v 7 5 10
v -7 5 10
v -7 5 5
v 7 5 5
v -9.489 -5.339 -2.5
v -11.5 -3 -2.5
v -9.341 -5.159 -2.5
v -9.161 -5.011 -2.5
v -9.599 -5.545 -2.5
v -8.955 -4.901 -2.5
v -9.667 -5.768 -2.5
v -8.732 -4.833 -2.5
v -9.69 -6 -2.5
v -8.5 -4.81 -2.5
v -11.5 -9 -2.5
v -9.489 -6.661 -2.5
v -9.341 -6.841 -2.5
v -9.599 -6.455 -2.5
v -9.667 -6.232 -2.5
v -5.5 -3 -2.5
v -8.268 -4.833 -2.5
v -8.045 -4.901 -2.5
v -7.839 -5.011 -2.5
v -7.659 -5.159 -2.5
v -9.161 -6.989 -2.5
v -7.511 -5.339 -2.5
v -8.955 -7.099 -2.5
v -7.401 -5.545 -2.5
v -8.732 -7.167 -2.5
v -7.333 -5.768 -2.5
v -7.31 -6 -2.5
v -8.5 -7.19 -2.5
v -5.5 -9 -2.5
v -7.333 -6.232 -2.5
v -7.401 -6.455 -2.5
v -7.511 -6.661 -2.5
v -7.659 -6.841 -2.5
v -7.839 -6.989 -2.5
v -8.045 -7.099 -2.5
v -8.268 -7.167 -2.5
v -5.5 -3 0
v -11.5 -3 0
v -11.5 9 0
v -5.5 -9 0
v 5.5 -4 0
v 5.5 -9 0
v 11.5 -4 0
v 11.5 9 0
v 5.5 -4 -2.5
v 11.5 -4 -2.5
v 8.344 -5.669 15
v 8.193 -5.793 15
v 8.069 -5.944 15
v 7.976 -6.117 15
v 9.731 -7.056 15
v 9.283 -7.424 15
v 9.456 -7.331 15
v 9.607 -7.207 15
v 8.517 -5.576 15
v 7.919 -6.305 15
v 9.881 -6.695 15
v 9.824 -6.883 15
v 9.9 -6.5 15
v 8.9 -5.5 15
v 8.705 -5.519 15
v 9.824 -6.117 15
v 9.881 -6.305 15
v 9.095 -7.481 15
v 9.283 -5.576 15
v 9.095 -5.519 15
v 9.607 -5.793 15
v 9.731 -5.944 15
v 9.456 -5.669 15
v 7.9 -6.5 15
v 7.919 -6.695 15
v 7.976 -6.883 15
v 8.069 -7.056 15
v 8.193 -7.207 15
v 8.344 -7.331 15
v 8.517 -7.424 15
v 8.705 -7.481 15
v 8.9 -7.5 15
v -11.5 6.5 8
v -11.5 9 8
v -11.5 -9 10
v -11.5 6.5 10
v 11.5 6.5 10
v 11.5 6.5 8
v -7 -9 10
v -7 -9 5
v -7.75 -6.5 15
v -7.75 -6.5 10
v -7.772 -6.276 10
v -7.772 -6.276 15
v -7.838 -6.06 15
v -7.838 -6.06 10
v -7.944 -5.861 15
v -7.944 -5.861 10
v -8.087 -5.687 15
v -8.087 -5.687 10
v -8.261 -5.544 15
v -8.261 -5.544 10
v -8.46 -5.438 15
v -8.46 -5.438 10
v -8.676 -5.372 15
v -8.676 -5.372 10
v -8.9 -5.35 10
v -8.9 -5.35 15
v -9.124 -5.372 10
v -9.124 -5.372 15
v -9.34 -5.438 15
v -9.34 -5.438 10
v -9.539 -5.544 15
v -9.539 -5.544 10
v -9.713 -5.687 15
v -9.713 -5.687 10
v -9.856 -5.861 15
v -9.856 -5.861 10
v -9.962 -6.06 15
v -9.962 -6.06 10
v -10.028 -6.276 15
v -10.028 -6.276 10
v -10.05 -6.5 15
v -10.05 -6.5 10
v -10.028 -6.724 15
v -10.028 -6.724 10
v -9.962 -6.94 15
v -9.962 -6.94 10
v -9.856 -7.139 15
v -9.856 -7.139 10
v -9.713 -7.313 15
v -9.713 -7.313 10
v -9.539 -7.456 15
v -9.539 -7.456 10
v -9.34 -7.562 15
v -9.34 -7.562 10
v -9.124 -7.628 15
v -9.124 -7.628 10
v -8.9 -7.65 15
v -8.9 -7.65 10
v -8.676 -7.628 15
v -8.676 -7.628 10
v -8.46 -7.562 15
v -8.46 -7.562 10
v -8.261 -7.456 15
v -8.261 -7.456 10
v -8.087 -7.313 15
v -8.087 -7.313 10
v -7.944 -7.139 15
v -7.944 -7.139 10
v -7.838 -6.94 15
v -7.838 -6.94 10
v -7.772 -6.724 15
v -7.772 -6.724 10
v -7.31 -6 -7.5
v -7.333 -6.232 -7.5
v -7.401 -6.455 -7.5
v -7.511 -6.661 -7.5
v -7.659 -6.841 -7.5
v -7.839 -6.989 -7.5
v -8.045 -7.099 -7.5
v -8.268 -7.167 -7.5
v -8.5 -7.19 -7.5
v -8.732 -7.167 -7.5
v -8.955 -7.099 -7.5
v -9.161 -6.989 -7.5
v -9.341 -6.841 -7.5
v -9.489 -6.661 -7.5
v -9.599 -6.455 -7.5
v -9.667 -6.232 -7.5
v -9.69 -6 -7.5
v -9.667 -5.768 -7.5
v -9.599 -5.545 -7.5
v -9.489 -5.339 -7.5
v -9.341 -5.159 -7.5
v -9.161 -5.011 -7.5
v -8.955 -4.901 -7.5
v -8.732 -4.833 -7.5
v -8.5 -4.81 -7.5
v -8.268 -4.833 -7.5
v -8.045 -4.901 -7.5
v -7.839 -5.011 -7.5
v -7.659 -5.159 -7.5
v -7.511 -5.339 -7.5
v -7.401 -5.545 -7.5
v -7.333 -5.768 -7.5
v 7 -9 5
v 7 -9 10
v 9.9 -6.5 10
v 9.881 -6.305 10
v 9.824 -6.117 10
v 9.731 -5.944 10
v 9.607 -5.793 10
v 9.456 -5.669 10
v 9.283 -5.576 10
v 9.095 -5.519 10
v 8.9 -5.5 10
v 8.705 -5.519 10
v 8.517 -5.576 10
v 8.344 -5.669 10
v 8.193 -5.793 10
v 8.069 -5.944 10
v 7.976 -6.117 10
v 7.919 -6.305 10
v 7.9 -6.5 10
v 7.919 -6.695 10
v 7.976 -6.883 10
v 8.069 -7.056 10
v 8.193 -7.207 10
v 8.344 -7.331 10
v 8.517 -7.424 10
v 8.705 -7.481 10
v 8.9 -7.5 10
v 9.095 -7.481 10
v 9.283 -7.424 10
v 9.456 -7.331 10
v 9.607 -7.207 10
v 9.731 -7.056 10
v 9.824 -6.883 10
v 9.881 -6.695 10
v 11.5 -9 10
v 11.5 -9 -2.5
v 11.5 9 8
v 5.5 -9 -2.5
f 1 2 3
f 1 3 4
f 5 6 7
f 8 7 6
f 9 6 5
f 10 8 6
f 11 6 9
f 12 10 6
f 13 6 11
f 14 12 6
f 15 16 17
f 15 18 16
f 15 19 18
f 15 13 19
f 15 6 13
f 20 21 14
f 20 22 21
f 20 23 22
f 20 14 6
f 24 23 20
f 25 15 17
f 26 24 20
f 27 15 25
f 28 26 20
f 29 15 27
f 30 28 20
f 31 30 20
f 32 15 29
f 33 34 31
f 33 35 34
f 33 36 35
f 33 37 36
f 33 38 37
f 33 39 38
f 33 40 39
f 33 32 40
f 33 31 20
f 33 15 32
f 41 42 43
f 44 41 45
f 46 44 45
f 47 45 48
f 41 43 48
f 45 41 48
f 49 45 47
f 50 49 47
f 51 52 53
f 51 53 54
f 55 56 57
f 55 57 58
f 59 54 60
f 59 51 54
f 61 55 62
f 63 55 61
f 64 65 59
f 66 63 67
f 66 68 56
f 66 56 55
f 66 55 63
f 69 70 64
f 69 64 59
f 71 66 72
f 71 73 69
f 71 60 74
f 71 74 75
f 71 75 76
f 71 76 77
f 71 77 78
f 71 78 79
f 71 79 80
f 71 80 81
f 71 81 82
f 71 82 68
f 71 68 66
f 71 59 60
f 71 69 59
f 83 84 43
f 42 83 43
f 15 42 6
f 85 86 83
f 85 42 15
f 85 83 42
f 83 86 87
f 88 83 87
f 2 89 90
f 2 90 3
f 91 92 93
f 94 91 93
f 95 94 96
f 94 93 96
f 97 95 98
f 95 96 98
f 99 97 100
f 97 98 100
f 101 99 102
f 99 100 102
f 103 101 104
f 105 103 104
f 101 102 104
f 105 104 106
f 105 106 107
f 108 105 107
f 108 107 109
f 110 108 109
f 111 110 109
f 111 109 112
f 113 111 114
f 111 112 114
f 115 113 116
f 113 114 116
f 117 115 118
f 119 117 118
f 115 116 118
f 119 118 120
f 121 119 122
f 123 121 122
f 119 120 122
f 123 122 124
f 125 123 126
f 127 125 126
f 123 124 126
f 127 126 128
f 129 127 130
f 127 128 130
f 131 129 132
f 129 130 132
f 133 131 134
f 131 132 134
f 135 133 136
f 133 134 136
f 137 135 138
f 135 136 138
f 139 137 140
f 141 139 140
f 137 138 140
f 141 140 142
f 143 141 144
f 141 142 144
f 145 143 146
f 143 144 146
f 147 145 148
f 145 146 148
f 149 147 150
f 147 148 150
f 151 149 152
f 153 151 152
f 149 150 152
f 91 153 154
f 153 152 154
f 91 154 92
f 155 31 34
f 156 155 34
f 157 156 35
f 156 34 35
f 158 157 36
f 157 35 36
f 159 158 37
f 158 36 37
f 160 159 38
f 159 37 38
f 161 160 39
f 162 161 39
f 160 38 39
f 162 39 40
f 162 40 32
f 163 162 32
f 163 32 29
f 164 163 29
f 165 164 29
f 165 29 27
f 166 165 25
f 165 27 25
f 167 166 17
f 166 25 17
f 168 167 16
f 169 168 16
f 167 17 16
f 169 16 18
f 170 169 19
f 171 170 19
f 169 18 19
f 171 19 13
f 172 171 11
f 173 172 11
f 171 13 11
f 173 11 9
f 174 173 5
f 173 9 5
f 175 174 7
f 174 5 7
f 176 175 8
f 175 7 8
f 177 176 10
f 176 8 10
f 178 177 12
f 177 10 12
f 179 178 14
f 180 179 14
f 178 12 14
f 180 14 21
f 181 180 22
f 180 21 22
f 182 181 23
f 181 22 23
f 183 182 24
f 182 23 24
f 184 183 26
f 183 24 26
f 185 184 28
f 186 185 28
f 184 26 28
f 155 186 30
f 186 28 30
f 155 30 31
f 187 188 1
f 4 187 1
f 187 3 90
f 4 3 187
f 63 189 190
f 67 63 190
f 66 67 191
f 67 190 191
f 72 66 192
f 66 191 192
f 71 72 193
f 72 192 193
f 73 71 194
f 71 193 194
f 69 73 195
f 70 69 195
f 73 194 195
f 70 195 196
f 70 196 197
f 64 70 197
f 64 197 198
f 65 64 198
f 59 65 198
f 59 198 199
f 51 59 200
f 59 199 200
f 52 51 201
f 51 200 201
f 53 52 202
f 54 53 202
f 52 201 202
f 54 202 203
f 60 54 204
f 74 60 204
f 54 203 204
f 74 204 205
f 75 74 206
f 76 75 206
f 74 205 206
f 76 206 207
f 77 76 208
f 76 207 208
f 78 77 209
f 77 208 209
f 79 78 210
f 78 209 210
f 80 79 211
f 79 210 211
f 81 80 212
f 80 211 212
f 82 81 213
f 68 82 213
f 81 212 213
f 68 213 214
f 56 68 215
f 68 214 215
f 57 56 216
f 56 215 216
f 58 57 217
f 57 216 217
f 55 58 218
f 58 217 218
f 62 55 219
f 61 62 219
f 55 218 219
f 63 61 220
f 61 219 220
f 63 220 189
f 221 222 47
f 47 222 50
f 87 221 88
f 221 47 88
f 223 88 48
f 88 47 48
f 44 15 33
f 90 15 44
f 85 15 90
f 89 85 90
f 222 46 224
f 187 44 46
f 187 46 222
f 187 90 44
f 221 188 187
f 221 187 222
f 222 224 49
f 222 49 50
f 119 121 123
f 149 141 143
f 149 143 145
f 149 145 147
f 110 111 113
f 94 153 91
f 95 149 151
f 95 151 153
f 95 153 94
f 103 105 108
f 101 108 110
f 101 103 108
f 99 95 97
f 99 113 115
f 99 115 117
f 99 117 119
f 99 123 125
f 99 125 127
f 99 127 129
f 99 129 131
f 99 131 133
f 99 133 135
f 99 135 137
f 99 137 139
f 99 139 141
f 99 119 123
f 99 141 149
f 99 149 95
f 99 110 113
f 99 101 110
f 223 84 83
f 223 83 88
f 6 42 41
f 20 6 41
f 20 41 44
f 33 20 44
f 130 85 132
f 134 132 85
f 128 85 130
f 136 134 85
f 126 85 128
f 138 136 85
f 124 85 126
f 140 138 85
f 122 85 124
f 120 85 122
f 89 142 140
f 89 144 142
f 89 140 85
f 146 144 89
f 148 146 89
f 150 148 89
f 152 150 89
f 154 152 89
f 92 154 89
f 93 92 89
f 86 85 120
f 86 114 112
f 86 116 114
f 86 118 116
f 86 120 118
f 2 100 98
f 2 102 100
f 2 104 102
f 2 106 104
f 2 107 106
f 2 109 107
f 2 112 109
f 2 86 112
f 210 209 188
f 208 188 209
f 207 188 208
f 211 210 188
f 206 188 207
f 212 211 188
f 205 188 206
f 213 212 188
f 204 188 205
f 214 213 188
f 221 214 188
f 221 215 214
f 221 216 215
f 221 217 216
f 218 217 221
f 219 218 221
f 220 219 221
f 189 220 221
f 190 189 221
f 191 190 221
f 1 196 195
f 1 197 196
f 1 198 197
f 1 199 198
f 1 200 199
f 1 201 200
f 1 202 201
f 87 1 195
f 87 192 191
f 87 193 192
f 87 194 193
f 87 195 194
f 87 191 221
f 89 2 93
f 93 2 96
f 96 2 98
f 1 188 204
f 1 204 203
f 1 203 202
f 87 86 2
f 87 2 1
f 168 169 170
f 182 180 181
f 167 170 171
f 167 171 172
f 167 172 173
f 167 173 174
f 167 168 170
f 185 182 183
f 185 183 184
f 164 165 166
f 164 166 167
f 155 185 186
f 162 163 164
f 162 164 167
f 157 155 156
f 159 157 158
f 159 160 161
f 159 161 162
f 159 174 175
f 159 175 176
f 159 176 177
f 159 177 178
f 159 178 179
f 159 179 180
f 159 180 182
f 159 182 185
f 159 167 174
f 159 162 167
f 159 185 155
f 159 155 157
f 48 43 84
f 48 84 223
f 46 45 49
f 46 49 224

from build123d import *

# Parameters (mm, degrees)
F0_W      = 23
F0_H      = 18
F1_DEPTH  = 10
F2_W      = 6
F2_H      = 6
F2_H_2    = 5
F3_DEPTH  = 2.5
F4_R      = 1.19
F5_DEPTH  = 5
F6_W      = 14
F6_H      = 14
F7_DEPTH  = 5
F8_R      = 1.15
F8_R_2    = 1
F9_DEPTH  = 5
F10_W     = 23
F10_H     = 2.5
F11_DEPTH = 2


with BuildPart() as f1:
    # F0 (on Top) → F1 (new body)
    with BuildSketch(Plane.XY):
        Rectangle(F0_W, F0_H)
    extrude(amount=F1_DEPTH)

    # F2 (on face) → F3 (join)
    with BuildSketch(Plane(origin=(0, 0, 0), x_dir=(1, 0, 0), z_dir=(0, 0, -1))):
        with Locations((-8.5, 6)):
            Rectangle(F2_W, F2_H)
        with Locations((8.5, 6.5)):
            Rectangle(F2_W, F2_H_2)
    extrude(amount=F3_DEPTH)

    # F4 (on face) → F5 (join)
    with BuildSketch(Plane(origin=(0, 0, -2.5), x_dir=(1, 0, 0), z_dir=(0, 0, -1))):
        with Locations((-8.5, 6)):
            Circle(F4_R)
    extrude(amount=F5_DEPTH)

    # F6 (on face) → F7 (cut)
    with BuildSketch(Plane.XY.offset(10)):
        with Locations((0, -2)):
            Rectangle(F6_W, F6_H)
    extrude(amount=-F7_DEPTH, mode=Mode.SUBTRACT)

    # F8 (on face) → F9 (join)
    with BuildSketch(Plane.XY.offset(10)):
        with Locations((-8.9, -6.5)):
            Circle(F8_R)
        with Locations((8.9, -6.5)):
            Circle(F8_R_2)
    extrude(amount=F9_DEPTH)

    # F10 (on face) → F11 (cut)
    with BuildSketch(Plane.XY.offset(10)):
        with Locations((0, 7.75)):
            Rectangle(F10_W, F10_H)
    extrude(amount=-F11_DEPTH, mode=Mode.SUBTRACT)


solid = f1.part
